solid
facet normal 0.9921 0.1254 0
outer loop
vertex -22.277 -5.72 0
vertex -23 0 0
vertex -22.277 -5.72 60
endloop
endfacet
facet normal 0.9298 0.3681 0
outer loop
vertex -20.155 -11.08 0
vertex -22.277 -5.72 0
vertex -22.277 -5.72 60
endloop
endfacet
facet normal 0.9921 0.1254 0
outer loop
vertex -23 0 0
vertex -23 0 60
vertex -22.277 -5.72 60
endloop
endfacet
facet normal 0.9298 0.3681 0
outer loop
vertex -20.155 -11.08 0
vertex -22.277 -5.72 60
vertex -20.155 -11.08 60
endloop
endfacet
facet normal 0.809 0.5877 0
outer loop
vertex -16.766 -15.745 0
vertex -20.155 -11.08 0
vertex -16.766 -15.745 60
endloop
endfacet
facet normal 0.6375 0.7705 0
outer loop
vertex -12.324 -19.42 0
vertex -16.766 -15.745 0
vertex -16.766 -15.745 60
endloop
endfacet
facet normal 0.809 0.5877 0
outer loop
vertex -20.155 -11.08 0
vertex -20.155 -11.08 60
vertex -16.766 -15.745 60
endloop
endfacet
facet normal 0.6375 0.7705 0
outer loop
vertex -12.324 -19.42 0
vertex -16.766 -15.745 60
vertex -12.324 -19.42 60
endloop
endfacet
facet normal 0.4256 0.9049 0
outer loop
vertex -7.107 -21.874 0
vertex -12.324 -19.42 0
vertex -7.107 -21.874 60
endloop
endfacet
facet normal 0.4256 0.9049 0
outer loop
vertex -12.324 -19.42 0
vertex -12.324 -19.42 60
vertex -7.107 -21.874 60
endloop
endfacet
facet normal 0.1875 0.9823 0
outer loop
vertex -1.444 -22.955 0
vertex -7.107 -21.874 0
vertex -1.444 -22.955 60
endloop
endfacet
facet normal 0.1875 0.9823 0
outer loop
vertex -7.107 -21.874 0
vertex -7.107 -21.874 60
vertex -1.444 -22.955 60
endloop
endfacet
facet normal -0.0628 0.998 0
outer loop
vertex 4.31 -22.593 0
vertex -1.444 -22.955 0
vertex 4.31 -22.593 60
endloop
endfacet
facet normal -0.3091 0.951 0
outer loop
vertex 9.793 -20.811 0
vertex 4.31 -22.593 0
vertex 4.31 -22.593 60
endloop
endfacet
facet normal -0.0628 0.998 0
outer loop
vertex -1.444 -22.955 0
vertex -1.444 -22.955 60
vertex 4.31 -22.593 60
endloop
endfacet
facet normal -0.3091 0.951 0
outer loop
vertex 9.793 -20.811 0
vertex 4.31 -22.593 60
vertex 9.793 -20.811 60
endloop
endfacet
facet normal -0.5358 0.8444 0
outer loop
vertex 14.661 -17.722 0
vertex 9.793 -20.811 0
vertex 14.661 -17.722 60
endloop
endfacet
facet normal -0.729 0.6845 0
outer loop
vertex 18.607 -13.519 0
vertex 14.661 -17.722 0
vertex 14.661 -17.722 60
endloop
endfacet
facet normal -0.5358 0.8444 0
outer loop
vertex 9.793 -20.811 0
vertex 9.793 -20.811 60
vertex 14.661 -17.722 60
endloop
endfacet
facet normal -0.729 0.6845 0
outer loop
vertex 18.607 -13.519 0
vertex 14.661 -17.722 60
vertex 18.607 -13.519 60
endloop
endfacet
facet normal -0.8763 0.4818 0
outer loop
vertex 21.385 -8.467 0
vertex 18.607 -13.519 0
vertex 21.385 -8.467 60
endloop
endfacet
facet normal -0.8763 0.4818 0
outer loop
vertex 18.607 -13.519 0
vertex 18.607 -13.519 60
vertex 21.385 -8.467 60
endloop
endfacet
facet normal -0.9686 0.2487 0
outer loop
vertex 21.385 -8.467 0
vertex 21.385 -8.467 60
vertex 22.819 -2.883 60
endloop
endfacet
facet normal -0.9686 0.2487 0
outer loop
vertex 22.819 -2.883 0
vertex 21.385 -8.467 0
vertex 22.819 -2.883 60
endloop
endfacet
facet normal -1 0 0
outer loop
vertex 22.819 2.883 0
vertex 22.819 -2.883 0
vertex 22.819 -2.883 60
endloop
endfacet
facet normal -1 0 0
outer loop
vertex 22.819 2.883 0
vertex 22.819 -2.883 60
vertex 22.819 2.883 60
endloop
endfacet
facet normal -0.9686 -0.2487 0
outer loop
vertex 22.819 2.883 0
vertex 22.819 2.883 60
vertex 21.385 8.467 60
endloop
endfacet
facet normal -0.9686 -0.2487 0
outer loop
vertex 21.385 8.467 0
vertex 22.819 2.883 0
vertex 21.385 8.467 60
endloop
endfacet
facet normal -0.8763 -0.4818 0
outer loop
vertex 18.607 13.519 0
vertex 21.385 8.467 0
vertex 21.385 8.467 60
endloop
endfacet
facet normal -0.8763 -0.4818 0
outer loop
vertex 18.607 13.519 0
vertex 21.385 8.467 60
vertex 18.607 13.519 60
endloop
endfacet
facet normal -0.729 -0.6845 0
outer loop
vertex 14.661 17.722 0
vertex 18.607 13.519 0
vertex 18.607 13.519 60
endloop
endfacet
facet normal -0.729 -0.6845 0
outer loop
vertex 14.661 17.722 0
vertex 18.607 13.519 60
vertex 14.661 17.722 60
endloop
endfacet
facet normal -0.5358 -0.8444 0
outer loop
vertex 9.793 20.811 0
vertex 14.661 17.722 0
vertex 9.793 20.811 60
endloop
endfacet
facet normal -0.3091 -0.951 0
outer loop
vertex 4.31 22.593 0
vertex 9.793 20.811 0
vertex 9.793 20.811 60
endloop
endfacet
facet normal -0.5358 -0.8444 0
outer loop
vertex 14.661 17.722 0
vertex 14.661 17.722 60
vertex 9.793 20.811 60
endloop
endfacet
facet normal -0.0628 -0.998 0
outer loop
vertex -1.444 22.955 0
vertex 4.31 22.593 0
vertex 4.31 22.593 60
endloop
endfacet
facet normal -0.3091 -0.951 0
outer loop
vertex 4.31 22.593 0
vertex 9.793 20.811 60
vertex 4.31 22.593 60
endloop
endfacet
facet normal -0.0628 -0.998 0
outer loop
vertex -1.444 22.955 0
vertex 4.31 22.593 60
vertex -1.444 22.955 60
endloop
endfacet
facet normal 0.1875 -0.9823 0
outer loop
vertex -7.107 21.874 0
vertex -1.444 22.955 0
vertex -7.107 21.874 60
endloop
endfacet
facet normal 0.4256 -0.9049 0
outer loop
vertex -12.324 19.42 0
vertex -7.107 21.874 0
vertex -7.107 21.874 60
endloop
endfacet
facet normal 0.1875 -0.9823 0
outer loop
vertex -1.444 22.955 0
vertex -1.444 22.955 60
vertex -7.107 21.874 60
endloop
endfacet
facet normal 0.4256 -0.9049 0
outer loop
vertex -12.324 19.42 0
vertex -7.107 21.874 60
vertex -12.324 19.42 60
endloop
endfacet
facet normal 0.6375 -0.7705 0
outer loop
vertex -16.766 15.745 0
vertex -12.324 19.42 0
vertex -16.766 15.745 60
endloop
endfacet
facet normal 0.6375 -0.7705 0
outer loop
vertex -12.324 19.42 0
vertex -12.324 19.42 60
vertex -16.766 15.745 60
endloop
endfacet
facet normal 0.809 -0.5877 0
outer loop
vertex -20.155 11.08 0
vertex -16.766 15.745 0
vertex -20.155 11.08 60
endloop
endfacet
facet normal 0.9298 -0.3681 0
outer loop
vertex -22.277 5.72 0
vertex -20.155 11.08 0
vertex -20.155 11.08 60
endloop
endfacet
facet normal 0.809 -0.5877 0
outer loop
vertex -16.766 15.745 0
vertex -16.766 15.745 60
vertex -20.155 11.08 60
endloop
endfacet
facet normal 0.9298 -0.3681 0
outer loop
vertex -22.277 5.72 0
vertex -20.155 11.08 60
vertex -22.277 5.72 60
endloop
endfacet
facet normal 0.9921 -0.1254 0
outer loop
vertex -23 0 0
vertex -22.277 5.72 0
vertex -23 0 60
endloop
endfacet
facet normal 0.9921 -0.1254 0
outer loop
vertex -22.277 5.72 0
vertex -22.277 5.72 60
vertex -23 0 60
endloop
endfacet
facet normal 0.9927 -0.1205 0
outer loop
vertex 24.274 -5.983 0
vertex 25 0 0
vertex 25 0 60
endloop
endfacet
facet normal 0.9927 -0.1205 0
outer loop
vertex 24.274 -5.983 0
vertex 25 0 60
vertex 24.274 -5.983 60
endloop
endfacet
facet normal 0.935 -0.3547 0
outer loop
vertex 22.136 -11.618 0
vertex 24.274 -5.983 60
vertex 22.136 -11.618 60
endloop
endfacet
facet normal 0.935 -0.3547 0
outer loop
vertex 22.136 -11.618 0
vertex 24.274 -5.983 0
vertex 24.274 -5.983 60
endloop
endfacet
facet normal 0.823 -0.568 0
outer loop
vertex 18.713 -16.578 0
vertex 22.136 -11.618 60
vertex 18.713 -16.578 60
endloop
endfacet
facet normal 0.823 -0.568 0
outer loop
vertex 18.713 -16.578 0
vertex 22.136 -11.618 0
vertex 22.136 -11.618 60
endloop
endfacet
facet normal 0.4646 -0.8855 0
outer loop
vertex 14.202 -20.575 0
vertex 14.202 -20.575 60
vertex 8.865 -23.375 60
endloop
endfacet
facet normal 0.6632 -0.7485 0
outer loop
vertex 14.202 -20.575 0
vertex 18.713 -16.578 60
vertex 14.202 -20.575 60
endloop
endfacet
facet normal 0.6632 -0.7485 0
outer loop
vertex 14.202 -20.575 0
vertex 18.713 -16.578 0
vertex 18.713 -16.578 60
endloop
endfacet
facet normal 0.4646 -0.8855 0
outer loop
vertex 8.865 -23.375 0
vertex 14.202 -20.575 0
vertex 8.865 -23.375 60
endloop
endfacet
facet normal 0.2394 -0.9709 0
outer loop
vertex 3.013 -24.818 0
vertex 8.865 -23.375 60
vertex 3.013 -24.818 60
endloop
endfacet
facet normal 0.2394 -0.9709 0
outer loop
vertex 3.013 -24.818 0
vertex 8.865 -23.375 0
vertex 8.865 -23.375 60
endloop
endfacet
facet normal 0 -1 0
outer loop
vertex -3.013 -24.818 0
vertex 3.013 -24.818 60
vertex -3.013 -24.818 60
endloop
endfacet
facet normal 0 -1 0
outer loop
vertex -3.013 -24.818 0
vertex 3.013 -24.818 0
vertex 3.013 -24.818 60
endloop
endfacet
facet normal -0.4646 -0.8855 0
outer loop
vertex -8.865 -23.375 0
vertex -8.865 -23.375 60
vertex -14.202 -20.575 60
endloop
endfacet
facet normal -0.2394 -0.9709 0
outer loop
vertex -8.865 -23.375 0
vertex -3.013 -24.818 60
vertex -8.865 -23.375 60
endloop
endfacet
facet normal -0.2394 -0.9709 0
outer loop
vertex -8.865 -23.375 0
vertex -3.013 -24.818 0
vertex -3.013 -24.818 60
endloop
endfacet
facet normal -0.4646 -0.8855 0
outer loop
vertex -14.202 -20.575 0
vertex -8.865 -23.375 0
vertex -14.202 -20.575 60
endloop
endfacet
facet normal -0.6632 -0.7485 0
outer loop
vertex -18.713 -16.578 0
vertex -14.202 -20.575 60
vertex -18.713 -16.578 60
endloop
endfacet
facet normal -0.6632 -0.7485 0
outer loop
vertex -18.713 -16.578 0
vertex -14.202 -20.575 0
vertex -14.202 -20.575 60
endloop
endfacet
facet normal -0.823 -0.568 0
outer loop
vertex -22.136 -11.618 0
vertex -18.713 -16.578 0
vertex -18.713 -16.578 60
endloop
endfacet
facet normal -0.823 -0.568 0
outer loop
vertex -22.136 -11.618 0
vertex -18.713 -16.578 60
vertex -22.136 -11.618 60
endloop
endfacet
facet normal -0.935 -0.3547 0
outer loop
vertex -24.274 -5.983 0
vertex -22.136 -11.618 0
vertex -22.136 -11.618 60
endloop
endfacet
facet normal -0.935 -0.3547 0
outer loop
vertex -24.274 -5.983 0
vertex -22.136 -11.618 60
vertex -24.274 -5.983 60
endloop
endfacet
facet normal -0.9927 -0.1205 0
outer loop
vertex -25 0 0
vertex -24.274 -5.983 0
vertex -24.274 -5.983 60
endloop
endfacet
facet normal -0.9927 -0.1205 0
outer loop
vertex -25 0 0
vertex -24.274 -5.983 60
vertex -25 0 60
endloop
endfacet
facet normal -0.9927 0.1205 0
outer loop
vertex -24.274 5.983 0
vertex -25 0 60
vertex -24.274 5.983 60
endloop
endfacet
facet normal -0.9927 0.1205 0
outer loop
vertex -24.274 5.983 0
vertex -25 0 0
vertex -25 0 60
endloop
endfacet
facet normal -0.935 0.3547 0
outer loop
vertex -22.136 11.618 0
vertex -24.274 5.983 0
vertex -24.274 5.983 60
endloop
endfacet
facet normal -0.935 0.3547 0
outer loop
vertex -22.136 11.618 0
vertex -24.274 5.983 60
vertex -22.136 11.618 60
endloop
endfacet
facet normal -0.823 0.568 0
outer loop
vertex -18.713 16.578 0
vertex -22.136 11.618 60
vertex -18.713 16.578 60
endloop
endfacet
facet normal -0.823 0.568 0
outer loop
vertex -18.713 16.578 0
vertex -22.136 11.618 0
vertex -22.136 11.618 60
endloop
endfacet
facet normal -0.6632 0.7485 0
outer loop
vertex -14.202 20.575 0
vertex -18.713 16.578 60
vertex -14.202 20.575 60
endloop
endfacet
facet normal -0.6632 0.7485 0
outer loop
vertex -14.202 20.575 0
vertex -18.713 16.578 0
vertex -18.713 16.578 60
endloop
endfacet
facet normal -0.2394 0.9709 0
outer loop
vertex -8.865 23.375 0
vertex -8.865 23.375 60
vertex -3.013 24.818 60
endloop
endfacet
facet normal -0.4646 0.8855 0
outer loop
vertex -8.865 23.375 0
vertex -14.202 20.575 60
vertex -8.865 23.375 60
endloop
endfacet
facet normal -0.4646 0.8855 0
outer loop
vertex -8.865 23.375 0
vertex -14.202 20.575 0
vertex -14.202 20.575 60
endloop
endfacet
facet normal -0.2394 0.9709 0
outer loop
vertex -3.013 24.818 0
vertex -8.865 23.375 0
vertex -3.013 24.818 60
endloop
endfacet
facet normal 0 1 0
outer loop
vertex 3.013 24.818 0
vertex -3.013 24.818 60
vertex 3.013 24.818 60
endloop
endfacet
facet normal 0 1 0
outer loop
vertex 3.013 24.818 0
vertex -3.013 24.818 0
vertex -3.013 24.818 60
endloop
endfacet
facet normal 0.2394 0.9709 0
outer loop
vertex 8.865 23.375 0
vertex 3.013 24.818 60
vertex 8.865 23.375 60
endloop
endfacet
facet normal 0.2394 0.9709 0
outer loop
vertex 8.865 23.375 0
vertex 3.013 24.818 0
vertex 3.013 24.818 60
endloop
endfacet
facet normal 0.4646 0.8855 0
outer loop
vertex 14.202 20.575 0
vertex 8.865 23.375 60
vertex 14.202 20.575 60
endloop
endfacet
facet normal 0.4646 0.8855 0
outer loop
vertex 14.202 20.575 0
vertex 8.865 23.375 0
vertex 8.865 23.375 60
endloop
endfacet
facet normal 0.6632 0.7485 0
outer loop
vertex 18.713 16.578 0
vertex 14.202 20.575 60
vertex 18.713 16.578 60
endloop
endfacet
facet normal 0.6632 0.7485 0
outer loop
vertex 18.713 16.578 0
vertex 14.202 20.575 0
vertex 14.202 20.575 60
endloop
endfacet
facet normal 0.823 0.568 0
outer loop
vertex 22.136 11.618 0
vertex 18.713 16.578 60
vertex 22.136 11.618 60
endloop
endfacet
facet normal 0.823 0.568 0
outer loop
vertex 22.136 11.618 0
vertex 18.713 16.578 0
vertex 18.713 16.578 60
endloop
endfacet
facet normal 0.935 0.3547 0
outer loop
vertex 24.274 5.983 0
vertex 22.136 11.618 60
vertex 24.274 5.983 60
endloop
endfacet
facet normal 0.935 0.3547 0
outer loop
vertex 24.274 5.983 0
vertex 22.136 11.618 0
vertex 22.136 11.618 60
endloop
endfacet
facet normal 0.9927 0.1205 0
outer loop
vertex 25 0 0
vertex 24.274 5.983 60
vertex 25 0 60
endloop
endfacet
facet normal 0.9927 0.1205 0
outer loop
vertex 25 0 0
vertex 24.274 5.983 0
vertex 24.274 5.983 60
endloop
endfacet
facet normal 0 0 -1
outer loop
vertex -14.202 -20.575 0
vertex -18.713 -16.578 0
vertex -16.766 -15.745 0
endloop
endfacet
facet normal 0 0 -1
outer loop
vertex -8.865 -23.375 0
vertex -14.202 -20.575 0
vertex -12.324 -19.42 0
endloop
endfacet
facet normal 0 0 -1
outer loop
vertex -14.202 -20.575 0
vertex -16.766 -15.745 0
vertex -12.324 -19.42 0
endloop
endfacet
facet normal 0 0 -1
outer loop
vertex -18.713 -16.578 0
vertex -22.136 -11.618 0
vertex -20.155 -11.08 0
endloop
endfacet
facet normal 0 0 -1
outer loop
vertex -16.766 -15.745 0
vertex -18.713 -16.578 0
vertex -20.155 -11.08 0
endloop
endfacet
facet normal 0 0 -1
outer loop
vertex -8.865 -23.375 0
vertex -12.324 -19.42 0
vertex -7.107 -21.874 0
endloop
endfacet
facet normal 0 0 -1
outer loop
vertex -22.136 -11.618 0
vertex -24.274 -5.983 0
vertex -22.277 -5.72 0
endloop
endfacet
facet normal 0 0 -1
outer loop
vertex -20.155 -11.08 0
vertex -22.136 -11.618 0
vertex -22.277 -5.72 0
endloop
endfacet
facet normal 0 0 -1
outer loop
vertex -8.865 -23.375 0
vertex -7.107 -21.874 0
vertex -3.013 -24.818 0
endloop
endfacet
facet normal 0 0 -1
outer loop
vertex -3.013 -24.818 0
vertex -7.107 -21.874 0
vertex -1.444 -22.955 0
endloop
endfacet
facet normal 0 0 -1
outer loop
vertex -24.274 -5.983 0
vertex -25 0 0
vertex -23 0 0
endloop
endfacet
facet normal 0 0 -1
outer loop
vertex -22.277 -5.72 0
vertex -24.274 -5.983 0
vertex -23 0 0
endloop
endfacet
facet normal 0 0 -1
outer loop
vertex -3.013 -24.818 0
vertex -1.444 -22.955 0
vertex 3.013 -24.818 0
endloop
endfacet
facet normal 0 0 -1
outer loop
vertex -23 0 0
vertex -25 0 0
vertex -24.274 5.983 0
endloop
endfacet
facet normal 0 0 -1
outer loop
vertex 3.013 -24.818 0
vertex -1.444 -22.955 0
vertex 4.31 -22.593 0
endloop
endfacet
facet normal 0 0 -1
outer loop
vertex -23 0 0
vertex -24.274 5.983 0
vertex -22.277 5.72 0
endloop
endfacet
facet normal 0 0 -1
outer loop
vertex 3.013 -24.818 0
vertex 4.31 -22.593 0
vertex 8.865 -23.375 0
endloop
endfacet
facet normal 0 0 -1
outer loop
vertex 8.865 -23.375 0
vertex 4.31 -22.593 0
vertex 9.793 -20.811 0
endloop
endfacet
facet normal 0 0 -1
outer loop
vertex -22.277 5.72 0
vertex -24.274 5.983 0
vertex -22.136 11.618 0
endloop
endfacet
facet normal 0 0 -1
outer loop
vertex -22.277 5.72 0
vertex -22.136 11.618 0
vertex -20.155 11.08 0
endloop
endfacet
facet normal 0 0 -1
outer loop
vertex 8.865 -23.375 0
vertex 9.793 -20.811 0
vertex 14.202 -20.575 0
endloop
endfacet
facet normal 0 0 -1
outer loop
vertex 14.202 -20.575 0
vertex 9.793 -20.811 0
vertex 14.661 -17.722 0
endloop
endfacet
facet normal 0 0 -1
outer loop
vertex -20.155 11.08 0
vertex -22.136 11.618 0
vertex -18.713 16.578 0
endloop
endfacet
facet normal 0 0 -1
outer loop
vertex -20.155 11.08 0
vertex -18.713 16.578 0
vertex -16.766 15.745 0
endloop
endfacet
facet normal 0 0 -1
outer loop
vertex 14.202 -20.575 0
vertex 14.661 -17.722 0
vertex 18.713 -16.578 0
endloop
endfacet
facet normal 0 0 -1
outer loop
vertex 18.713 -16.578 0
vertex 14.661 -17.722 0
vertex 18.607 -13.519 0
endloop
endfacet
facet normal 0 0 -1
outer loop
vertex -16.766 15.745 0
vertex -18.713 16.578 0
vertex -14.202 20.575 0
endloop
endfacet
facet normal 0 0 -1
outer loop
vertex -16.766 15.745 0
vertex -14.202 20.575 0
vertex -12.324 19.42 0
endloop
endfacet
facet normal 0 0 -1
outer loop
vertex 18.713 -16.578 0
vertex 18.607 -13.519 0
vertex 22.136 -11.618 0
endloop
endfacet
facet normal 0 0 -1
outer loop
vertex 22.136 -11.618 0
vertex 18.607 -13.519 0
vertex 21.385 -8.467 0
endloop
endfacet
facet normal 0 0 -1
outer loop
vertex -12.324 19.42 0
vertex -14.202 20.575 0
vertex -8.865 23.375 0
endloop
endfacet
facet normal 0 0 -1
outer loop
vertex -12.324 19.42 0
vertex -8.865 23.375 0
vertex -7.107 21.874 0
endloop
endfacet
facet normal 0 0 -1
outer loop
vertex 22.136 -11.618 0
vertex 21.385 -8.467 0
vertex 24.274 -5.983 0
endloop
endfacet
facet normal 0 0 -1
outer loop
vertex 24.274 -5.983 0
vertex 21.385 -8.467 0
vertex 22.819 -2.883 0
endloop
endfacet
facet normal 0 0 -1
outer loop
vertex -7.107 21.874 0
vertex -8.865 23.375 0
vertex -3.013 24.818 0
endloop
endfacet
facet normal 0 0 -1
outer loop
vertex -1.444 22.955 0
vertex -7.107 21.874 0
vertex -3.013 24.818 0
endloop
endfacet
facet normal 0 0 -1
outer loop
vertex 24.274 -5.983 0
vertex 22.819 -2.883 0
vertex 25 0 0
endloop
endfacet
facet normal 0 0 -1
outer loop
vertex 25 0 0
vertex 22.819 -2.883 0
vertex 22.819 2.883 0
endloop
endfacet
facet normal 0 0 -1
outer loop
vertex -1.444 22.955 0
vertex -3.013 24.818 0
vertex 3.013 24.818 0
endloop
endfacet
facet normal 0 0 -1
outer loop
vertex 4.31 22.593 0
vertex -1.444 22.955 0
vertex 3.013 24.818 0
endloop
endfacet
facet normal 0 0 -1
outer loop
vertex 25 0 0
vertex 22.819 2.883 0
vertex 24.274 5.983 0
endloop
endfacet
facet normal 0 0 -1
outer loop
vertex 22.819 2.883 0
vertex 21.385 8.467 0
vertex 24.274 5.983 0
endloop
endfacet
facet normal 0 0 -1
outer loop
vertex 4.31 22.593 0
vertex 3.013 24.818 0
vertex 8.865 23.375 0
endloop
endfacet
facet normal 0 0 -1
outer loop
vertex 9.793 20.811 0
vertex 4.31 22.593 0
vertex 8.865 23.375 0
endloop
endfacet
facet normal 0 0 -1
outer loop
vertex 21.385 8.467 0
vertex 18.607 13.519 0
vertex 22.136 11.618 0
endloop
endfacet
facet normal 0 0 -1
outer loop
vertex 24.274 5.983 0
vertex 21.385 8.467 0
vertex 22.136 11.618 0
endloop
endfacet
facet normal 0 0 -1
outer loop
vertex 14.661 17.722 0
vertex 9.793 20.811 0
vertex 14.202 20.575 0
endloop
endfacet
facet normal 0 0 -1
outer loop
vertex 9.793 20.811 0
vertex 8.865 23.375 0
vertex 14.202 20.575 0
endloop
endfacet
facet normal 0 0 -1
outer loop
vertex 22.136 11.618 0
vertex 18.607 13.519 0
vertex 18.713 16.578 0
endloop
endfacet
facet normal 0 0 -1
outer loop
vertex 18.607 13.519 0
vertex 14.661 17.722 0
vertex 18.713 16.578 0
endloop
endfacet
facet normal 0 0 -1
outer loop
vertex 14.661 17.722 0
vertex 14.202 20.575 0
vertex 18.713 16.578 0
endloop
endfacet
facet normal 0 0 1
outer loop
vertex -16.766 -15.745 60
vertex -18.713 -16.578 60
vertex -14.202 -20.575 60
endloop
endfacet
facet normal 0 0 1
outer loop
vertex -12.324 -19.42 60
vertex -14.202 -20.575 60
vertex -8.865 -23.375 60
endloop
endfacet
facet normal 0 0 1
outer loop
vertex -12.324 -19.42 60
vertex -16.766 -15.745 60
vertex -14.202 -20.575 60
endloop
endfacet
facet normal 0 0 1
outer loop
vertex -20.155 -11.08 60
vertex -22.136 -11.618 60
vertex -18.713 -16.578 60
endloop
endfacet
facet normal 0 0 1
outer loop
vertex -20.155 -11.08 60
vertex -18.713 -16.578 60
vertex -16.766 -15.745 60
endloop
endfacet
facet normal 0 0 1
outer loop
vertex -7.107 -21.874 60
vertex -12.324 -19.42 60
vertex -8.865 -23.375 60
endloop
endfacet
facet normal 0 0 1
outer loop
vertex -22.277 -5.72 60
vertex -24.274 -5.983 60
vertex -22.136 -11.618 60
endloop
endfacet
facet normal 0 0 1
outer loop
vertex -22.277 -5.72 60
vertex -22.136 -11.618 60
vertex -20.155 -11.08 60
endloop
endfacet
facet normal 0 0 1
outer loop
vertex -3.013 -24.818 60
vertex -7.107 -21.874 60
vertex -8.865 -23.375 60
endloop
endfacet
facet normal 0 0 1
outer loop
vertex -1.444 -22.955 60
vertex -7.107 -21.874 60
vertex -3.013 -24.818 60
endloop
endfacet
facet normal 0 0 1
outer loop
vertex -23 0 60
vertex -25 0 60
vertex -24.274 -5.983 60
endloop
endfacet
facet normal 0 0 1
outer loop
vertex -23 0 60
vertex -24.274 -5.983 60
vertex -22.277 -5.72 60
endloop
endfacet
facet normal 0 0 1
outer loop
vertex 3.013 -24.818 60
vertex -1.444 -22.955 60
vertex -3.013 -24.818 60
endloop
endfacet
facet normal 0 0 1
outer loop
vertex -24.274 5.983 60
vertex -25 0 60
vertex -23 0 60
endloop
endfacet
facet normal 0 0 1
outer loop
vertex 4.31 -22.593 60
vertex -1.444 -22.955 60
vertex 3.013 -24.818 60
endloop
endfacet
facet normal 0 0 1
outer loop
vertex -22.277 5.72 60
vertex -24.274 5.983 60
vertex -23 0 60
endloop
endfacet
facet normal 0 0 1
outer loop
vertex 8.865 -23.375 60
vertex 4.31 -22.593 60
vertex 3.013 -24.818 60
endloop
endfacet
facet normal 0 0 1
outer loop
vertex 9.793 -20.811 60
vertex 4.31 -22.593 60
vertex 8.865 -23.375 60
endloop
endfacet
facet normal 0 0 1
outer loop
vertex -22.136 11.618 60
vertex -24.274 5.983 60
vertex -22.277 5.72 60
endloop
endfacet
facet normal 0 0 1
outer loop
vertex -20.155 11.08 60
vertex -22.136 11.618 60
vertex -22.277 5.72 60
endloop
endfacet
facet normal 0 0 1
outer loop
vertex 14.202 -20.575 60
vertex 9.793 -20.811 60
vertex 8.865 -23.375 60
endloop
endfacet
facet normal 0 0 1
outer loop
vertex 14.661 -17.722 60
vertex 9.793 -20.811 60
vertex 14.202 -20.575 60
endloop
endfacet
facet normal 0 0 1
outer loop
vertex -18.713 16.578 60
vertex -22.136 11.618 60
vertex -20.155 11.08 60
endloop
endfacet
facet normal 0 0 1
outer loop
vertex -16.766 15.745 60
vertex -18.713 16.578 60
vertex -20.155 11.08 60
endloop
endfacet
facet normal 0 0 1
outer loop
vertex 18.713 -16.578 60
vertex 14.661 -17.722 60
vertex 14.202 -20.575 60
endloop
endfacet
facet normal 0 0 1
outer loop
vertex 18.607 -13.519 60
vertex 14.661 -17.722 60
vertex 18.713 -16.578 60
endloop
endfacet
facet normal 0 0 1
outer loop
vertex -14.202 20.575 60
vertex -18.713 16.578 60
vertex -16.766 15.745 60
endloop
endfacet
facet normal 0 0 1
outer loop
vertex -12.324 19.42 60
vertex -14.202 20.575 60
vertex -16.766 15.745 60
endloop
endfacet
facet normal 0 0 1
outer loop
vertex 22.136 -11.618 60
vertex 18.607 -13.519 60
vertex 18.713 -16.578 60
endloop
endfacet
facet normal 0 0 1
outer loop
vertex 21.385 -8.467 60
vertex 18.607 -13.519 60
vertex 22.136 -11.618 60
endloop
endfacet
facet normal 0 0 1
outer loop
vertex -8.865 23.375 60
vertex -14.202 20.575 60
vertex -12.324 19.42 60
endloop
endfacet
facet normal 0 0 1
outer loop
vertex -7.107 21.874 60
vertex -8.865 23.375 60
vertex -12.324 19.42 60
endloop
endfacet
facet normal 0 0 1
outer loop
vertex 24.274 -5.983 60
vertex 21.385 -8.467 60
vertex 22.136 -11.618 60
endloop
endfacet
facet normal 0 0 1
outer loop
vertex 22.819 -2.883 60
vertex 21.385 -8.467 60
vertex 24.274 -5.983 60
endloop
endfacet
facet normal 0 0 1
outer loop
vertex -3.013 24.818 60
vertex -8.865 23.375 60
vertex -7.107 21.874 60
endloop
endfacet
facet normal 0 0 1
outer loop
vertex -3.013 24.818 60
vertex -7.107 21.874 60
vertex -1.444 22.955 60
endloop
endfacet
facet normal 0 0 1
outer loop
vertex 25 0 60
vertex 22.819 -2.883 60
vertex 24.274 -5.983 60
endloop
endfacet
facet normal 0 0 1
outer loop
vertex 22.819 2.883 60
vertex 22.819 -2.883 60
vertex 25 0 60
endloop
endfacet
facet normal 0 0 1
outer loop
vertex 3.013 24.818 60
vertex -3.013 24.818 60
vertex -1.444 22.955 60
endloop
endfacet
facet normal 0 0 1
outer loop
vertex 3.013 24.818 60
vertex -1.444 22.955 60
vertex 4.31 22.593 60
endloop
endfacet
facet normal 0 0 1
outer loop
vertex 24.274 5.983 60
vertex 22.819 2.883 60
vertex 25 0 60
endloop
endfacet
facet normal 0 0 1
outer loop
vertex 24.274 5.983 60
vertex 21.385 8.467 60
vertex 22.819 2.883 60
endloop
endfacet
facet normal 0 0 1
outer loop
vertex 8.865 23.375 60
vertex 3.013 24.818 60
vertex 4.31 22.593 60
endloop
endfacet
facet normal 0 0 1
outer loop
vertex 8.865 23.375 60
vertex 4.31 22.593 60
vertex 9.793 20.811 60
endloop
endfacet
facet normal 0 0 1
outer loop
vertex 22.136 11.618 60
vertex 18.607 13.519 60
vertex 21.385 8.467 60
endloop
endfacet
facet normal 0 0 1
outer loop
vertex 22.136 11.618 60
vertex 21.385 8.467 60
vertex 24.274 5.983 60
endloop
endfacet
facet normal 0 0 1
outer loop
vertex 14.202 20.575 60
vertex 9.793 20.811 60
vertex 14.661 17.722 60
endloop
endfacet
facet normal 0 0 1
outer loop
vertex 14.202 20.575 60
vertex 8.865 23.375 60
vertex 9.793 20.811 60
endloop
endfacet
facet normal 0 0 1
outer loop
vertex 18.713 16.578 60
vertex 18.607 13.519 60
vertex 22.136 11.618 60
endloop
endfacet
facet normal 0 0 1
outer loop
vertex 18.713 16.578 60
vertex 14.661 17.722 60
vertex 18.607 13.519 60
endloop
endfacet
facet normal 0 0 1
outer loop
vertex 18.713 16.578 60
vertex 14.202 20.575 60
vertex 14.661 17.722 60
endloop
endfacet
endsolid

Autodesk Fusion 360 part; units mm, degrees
sketch "スケッチ1" plane through (0, 0, 0) normal (0, 0, 1) x (1, 0, 0)
  circle A0 centre (0, 0) radius 25
  circle A1 centre (0, 0) radius 22.5
  dimension "d1" = 45
extrude "押し出し1" add sketch "スケッチ1" along normal blind 70
sketch "スケッチ2" plane through (0, 0, 70) normal (0, 0, 1) x (-1, 0, 0)
  circle A0 centre (0, 0) radius 22.5
  circle A1 centre (0, 0) radius 25
  circle A2 centre (0, 0) radius 23
extrude "押し出し2" cut sketch "スケッチ2" against normal blind 75 contours A2
extrude "押し出し3" cut 1 faces at (24.1546, -2.3847, 70) along direction (0, 0, -1) blind 10
